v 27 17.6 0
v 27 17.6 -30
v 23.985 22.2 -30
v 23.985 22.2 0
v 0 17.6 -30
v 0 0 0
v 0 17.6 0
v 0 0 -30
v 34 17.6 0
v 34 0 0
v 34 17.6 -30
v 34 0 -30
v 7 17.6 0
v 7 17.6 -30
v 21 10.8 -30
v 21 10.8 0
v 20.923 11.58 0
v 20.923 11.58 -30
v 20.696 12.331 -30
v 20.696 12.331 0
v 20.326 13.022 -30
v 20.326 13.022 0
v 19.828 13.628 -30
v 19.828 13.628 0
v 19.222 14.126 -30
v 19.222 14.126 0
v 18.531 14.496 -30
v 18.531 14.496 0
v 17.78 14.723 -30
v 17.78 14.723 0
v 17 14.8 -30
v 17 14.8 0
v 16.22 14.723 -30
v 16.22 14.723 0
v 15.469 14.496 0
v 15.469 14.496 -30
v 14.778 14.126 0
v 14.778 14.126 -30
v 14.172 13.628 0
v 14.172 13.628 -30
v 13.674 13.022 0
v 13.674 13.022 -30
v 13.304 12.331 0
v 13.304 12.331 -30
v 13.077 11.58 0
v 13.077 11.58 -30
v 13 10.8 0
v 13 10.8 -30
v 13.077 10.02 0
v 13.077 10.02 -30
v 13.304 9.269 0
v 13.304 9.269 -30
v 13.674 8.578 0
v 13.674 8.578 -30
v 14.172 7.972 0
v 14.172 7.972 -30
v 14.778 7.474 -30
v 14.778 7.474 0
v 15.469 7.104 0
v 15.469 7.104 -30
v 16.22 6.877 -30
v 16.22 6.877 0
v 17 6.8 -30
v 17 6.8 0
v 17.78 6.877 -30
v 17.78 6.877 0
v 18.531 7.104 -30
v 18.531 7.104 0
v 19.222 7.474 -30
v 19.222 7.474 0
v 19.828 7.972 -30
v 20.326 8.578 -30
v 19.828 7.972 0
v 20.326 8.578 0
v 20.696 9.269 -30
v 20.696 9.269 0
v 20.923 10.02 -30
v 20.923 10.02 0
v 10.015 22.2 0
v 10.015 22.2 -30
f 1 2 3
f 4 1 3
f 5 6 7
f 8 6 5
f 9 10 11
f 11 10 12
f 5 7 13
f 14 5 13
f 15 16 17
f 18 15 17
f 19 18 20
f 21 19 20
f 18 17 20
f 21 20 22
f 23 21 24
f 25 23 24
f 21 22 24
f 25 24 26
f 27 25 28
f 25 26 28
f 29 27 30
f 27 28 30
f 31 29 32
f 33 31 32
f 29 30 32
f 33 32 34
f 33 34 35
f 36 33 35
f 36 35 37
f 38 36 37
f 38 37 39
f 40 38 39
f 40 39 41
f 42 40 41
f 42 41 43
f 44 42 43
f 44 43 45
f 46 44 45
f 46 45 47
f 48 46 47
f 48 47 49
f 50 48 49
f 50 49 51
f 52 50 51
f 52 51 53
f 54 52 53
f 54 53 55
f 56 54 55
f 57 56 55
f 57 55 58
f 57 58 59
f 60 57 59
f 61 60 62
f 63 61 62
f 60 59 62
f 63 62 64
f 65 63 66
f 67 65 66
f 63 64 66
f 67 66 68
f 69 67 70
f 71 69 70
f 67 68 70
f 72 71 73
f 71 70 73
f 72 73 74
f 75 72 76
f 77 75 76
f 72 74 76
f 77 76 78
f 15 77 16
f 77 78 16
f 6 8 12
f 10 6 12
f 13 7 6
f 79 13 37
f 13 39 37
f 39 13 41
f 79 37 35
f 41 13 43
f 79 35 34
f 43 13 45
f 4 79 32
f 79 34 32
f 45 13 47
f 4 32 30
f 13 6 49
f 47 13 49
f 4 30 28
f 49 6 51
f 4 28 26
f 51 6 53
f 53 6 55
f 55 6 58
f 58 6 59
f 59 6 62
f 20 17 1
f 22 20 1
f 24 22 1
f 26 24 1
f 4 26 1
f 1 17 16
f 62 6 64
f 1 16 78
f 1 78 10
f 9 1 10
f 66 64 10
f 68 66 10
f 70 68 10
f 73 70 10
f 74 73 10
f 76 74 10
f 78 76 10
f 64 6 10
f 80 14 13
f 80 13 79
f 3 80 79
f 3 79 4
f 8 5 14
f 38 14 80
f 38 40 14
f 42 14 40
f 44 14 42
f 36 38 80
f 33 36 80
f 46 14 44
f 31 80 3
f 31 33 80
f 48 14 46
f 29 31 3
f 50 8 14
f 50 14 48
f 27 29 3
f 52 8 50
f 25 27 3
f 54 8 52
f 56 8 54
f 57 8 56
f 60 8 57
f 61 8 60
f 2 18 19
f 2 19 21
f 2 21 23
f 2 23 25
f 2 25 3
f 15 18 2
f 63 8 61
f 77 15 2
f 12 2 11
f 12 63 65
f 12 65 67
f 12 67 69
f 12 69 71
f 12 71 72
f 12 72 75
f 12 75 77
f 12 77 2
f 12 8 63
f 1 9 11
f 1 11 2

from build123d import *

# Parameters (mm, degrees)
SKETCH1_W           = 34
SKETCH1_H           = 30
BOSS_EXTRUDE1_DEPTH = 22.2
CUT_EXTRUDE1_DEPTH  = 51.486037674
SKETCH3_R           = 4
CUT_EXTRUDE2_DEPTH  = 51.486037674


with BuildPart() as part:
    # Sketch1 → Boss-Extrude1 (new body)
    with BuildSketch(Plane(origin=(0, 0, 0), x_dir=(1, 0, 0), z_dir=(0, 1, 0))):
        with Locations((17, 15)):
            Rectangle(SKETCH1_W, SKETCH1_H)
    extrude(amount=BOSS_EXTRUDE1_DEPTH)

    # Sketch2 → Cut-Extrude1 (cut, through all)
    with BuildSketch(Plane.XY):
        Polygon((34, 17.6), (27, 17.6), (23.985037314, 22.2), (34, 22.2), align=None)
        Polygon((0, 22.2), (0, 17.6), (7, 17.6), (10.014962686, 22.2), align=None)
    extrude(amount=-CUT_EXTRUDE1_DEPTH, mode=Mode.SUBTRACT)

    # Sketch3 → Cut-Extrude2 (cut, through all)
    with BuildSketch(Plane.XY):
        with Locations((17, 10.8)):
            Circle(SKETCH3_R)
    extrude(amount=-CUT_EXTRUDE2_DEPTH, mode=Mode.SUBTRACT)


solid = part.part
